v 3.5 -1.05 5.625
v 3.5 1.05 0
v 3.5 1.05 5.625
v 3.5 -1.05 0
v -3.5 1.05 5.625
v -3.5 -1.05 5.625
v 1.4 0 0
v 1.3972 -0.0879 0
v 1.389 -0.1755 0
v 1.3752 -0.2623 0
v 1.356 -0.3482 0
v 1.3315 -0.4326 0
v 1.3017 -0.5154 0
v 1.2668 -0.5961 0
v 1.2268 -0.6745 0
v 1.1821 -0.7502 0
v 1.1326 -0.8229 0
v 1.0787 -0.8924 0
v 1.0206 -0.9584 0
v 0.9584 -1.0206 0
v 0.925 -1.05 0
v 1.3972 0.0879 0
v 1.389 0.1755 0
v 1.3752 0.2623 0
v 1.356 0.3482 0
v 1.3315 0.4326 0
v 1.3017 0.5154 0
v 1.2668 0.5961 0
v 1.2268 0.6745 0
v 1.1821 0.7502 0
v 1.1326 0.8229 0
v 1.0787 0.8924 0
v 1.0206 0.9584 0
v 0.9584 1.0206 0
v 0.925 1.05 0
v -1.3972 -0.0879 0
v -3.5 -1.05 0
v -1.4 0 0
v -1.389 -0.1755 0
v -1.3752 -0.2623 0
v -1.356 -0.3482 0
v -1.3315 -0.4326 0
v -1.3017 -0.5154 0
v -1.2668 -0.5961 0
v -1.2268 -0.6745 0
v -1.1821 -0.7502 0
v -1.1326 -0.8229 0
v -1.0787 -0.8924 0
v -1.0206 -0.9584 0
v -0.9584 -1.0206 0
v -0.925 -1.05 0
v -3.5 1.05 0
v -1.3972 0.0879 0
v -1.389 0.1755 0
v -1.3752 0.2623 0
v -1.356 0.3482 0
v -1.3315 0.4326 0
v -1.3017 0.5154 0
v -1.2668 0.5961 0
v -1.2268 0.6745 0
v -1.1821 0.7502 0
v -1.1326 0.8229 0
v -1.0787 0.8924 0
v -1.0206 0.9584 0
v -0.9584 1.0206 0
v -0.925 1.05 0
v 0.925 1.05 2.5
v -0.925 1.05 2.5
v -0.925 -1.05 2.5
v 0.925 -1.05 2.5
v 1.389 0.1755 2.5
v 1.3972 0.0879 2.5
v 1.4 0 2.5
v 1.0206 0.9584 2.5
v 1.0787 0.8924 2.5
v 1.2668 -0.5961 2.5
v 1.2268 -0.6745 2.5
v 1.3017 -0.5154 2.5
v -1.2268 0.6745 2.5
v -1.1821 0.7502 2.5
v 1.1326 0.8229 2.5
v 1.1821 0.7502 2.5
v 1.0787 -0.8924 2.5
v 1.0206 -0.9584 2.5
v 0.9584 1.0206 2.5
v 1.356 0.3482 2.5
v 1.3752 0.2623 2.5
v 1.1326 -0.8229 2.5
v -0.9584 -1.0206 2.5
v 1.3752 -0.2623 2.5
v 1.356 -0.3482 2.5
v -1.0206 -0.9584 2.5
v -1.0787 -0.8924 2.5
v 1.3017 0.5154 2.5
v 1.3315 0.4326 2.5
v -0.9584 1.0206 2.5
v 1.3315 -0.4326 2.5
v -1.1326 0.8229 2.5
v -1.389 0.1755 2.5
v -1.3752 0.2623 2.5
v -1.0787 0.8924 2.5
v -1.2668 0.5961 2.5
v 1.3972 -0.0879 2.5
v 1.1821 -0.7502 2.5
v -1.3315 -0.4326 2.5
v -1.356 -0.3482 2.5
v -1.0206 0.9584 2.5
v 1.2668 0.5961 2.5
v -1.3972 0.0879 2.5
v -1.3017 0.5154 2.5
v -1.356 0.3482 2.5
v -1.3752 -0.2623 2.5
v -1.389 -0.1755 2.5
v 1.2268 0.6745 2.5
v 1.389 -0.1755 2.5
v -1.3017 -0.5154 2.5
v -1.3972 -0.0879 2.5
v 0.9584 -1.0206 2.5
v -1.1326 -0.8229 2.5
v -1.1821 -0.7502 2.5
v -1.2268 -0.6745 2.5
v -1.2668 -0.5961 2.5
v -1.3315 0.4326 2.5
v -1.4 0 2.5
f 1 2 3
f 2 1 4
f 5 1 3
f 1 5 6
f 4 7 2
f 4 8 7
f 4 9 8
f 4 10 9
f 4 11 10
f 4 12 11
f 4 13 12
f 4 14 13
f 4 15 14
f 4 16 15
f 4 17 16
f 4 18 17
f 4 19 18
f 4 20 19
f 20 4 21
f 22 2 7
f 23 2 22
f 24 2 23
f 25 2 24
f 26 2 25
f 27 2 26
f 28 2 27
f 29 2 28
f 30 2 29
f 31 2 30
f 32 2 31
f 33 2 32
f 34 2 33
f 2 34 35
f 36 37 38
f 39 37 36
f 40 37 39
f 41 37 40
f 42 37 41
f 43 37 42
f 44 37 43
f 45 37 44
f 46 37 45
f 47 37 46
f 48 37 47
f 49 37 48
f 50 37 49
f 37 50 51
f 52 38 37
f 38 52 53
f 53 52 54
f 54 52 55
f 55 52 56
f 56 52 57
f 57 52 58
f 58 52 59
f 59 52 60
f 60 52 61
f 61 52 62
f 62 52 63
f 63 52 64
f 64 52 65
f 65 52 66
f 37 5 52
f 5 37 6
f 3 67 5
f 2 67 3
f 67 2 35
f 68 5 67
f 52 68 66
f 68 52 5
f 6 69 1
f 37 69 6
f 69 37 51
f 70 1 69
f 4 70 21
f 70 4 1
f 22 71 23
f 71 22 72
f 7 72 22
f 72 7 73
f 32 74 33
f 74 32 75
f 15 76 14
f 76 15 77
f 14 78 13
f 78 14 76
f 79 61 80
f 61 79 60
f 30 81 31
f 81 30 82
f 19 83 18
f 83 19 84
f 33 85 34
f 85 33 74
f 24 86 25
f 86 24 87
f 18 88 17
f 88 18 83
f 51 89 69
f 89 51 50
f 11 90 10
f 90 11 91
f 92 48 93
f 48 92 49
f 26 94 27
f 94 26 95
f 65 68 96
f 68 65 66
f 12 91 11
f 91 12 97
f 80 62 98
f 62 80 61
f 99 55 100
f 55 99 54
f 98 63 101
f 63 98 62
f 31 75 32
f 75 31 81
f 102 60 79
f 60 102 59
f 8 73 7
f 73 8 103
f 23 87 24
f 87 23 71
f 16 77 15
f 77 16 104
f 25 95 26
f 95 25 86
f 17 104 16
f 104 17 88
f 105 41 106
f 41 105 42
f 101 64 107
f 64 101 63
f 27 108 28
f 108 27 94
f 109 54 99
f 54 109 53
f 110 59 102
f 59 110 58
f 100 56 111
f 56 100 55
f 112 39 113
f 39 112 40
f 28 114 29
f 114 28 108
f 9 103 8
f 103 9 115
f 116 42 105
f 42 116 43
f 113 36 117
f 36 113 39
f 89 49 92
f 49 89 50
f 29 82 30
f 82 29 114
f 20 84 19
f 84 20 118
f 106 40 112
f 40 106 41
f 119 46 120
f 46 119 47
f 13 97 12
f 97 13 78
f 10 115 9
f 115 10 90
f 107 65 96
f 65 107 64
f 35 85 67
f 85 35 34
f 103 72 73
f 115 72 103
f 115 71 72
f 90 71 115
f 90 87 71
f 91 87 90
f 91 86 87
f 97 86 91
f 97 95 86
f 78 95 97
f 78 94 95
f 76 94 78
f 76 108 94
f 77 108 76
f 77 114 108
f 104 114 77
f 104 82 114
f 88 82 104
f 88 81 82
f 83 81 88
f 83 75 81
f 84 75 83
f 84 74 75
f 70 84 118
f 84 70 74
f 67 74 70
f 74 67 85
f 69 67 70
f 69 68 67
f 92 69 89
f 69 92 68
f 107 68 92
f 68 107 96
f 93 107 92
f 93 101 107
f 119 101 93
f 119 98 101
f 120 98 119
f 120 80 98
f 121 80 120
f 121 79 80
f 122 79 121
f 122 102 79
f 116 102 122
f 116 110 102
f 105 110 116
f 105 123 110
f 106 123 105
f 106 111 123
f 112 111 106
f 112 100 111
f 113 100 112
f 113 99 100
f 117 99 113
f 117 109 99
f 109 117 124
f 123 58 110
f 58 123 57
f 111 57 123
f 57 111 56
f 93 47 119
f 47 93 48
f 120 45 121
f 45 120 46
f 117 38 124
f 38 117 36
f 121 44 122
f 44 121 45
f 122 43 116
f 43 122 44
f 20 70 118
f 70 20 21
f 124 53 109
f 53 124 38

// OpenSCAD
a = 100;

r_bolt = 2.8/2;
h_bolt = 2.5;
h_plate = 2.25*h_bolt;
t_plate = r_bolt*1.5;
difference() {
    translate([0,0, h_plate/2]) cube([5*r_bolt, t_plate, h_plate], center = true);
    cylinder(r = r_bolt, h = h_bolt, $fn = a);
}
